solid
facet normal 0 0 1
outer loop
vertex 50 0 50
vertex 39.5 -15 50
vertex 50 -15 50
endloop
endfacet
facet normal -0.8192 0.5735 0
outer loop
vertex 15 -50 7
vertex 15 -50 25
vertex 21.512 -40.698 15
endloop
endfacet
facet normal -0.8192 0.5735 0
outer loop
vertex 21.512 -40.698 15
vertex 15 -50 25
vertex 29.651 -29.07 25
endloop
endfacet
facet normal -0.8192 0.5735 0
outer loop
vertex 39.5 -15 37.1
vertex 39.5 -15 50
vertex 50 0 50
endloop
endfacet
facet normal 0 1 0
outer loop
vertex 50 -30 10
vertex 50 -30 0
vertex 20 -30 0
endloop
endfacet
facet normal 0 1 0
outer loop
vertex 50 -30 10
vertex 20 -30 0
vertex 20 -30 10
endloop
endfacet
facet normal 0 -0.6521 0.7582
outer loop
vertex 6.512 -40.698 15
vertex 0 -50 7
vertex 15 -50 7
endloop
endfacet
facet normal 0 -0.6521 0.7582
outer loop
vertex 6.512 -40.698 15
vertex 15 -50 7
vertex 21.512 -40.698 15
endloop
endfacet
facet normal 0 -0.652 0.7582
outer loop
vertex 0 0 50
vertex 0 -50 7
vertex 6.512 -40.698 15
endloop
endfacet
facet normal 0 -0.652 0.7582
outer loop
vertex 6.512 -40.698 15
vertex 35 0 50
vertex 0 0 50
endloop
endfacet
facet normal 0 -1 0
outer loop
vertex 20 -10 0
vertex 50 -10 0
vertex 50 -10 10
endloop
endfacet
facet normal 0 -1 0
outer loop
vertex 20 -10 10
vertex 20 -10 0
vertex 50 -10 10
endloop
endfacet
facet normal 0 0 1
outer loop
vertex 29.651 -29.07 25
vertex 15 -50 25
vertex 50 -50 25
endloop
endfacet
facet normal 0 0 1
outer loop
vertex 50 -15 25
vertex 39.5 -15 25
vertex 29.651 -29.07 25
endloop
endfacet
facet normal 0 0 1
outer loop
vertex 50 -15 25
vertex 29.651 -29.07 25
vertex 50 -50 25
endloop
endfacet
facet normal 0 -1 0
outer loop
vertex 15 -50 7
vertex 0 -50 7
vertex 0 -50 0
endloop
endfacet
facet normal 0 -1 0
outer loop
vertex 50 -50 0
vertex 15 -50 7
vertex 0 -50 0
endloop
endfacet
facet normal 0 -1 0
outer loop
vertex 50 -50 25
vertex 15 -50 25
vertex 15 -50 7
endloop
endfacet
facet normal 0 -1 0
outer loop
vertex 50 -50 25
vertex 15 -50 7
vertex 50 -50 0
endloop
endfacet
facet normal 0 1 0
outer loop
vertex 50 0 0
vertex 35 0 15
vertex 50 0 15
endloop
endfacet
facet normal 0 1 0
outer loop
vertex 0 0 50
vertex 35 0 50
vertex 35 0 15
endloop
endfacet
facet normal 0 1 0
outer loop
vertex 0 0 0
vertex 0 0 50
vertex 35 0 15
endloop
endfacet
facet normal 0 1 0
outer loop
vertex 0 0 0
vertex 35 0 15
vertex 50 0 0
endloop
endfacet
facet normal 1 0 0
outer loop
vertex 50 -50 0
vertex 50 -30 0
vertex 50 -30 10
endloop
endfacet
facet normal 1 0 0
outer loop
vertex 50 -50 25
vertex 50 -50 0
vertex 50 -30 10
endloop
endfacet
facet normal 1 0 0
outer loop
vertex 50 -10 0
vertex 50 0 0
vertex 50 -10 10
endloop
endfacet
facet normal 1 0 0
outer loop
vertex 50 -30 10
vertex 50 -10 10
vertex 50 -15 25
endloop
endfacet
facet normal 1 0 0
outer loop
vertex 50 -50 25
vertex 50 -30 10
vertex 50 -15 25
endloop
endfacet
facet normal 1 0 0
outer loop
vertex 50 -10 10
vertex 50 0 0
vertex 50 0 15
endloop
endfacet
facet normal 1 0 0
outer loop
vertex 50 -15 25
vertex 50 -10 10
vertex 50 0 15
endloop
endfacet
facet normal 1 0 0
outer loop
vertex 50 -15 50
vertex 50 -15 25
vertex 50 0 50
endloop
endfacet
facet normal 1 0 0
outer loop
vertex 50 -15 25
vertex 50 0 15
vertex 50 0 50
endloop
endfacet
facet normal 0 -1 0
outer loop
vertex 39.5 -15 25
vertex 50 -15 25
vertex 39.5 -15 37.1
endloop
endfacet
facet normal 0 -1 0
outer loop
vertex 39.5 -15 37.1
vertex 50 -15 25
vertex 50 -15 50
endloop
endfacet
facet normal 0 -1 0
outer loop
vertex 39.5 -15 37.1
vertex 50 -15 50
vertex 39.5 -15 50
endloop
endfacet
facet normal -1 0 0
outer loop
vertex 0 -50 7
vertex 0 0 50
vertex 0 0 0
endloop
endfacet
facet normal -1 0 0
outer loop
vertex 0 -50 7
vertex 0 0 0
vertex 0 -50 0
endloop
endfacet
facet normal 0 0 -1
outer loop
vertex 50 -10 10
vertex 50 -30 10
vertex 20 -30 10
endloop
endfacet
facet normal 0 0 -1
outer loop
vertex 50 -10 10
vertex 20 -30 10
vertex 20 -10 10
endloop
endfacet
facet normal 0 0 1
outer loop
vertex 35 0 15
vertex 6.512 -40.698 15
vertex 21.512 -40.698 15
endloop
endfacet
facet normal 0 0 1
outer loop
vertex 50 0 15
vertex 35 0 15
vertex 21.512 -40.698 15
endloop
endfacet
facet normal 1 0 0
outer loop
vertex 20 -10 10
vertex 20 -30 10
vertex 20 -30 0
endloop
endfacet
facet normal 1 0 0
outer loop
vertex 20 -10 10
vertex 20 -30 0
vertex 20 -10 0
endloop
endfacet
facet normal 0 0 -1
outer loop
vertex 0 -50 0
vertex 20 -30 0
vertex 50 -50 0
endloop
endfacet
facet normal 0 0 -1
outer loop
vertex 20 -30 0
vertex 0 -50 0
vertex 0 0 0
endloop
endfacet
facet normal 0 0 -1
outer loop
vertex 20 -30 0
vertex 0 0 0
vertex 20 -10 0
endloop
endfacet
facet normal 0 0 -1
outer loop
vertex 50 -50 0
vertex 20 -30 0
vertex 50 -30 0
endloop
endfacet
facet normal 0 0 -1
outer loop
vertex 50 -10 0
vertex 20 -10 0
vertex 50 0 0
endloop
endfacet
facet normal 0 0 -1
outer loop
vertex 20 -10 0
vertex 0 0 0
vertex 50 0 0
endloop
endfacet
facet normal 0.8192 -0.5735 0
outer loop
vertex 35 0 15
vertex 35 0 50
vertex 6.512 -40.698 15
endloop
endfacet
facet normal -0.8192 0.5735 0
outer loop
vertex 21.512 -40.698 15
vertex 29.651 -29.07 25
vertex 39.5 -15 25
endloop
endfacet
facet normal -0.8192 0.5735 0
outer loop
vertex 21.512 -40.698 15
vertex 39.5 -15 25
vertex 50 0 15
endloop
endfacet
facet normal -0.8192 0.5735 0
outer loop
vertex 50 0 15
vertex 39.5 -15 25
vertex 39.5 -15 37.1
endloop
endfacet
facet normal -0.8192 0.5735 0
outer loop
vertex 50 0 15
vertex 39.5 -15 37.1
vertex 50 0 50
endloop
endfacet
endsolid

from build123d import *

# Parameters (mm, degrees)
F0_W      = 50
F0_H      = 50
F1_DEPTH  = 50
F3_DEPTH  = 43
F5_DEPTH  = 25
F6_DEPTH  = 43
F8_REACH  = 115.9479483752
F12_DEPTH = 35
F13_W     = 20
F13_H     = 10
F14_DEPTH = 30


with BuildPart() as f1:
    # F0 (on Front) → F1 (new body)
    with BuildSketch(Plane.XZ):
        with Locations((25, 25)):
            Rectangle(F0_W, F0_H)
    extrude(amount=F1_DEPTH)

    # F2 (on face) → F3 (cut)
    with BuildSketch(Plane.XY.offset(50)):
        Polygon((15, -50), (50, 0), (35, 0), (0, -50), align=None)
    extrude(amount=-F3_DEPTH, mode=Mode.SUBTRACT)

    # F4 (on face) → F5 (cut)
    with BuildSketch(Plane.XY.offset(50)):
        Polygon((50, -50), (50, -15), (39.5, -15), (15, -50), align=None)
    extrude(amount=-F5_DEPTH, mode=Mode.SUBTRACT)

    # F6 (cut): a face of the model
    f6_faces = [f1.faces().sort_by_distance(p)[0] for p in [
        (11.6666666667, -16.6666666667, 50),
    ]]
    extrude(f6_faces, amount=-F6_DEPTH, mode=Mode.SUBTRACT)

    f8_end = Plane(origin=(36.1029411765, -19.8529411765, 22.3235294118), x_dir=(-0.5734623444, -0.8192319205, 0), z_dir=(-0.8192319205, 0.5734623444, 0))
    # F7 (on face) → F8 (join, up to a plane its end follows)
    with BuildSketch(Plane(origin=(0, 0, 0), x_dir=(0, -1, 0), z_dir=(-1, 0, 0))):
        Polygon((50, 7), (0, 50), (0, 7), align=None)
    f8_long = extrude(amount=-F8_REACH, mode=Mode.PRIVATE)
    add(split(f8_long, bisect_by=f8_end, keep=Keep.TOP, mode=Mode.PRIVATE))

    # F10 (on plane+point) → F12 (cut, through all)
    with BuildSketch(Plane.XY.offset(50)):
        Polygon((15, -50), (50.0000000002, 0), (35.0000000002, 0), (0, -50), align=None)
    extrude(amount=-F12_DEPTH, mode=Mode.SUBTRACT)

    # F13 (on face) → F14 (cut)
    with BuildSketch(Plane.YZ.offset(50)):
        with Locations((-20, 5)):
            Rectangle(F13_W, F13_H)
    extrude(amount=-F14_DEPTH, mode=Mode.SUBTRACT)


solid = f1.part
